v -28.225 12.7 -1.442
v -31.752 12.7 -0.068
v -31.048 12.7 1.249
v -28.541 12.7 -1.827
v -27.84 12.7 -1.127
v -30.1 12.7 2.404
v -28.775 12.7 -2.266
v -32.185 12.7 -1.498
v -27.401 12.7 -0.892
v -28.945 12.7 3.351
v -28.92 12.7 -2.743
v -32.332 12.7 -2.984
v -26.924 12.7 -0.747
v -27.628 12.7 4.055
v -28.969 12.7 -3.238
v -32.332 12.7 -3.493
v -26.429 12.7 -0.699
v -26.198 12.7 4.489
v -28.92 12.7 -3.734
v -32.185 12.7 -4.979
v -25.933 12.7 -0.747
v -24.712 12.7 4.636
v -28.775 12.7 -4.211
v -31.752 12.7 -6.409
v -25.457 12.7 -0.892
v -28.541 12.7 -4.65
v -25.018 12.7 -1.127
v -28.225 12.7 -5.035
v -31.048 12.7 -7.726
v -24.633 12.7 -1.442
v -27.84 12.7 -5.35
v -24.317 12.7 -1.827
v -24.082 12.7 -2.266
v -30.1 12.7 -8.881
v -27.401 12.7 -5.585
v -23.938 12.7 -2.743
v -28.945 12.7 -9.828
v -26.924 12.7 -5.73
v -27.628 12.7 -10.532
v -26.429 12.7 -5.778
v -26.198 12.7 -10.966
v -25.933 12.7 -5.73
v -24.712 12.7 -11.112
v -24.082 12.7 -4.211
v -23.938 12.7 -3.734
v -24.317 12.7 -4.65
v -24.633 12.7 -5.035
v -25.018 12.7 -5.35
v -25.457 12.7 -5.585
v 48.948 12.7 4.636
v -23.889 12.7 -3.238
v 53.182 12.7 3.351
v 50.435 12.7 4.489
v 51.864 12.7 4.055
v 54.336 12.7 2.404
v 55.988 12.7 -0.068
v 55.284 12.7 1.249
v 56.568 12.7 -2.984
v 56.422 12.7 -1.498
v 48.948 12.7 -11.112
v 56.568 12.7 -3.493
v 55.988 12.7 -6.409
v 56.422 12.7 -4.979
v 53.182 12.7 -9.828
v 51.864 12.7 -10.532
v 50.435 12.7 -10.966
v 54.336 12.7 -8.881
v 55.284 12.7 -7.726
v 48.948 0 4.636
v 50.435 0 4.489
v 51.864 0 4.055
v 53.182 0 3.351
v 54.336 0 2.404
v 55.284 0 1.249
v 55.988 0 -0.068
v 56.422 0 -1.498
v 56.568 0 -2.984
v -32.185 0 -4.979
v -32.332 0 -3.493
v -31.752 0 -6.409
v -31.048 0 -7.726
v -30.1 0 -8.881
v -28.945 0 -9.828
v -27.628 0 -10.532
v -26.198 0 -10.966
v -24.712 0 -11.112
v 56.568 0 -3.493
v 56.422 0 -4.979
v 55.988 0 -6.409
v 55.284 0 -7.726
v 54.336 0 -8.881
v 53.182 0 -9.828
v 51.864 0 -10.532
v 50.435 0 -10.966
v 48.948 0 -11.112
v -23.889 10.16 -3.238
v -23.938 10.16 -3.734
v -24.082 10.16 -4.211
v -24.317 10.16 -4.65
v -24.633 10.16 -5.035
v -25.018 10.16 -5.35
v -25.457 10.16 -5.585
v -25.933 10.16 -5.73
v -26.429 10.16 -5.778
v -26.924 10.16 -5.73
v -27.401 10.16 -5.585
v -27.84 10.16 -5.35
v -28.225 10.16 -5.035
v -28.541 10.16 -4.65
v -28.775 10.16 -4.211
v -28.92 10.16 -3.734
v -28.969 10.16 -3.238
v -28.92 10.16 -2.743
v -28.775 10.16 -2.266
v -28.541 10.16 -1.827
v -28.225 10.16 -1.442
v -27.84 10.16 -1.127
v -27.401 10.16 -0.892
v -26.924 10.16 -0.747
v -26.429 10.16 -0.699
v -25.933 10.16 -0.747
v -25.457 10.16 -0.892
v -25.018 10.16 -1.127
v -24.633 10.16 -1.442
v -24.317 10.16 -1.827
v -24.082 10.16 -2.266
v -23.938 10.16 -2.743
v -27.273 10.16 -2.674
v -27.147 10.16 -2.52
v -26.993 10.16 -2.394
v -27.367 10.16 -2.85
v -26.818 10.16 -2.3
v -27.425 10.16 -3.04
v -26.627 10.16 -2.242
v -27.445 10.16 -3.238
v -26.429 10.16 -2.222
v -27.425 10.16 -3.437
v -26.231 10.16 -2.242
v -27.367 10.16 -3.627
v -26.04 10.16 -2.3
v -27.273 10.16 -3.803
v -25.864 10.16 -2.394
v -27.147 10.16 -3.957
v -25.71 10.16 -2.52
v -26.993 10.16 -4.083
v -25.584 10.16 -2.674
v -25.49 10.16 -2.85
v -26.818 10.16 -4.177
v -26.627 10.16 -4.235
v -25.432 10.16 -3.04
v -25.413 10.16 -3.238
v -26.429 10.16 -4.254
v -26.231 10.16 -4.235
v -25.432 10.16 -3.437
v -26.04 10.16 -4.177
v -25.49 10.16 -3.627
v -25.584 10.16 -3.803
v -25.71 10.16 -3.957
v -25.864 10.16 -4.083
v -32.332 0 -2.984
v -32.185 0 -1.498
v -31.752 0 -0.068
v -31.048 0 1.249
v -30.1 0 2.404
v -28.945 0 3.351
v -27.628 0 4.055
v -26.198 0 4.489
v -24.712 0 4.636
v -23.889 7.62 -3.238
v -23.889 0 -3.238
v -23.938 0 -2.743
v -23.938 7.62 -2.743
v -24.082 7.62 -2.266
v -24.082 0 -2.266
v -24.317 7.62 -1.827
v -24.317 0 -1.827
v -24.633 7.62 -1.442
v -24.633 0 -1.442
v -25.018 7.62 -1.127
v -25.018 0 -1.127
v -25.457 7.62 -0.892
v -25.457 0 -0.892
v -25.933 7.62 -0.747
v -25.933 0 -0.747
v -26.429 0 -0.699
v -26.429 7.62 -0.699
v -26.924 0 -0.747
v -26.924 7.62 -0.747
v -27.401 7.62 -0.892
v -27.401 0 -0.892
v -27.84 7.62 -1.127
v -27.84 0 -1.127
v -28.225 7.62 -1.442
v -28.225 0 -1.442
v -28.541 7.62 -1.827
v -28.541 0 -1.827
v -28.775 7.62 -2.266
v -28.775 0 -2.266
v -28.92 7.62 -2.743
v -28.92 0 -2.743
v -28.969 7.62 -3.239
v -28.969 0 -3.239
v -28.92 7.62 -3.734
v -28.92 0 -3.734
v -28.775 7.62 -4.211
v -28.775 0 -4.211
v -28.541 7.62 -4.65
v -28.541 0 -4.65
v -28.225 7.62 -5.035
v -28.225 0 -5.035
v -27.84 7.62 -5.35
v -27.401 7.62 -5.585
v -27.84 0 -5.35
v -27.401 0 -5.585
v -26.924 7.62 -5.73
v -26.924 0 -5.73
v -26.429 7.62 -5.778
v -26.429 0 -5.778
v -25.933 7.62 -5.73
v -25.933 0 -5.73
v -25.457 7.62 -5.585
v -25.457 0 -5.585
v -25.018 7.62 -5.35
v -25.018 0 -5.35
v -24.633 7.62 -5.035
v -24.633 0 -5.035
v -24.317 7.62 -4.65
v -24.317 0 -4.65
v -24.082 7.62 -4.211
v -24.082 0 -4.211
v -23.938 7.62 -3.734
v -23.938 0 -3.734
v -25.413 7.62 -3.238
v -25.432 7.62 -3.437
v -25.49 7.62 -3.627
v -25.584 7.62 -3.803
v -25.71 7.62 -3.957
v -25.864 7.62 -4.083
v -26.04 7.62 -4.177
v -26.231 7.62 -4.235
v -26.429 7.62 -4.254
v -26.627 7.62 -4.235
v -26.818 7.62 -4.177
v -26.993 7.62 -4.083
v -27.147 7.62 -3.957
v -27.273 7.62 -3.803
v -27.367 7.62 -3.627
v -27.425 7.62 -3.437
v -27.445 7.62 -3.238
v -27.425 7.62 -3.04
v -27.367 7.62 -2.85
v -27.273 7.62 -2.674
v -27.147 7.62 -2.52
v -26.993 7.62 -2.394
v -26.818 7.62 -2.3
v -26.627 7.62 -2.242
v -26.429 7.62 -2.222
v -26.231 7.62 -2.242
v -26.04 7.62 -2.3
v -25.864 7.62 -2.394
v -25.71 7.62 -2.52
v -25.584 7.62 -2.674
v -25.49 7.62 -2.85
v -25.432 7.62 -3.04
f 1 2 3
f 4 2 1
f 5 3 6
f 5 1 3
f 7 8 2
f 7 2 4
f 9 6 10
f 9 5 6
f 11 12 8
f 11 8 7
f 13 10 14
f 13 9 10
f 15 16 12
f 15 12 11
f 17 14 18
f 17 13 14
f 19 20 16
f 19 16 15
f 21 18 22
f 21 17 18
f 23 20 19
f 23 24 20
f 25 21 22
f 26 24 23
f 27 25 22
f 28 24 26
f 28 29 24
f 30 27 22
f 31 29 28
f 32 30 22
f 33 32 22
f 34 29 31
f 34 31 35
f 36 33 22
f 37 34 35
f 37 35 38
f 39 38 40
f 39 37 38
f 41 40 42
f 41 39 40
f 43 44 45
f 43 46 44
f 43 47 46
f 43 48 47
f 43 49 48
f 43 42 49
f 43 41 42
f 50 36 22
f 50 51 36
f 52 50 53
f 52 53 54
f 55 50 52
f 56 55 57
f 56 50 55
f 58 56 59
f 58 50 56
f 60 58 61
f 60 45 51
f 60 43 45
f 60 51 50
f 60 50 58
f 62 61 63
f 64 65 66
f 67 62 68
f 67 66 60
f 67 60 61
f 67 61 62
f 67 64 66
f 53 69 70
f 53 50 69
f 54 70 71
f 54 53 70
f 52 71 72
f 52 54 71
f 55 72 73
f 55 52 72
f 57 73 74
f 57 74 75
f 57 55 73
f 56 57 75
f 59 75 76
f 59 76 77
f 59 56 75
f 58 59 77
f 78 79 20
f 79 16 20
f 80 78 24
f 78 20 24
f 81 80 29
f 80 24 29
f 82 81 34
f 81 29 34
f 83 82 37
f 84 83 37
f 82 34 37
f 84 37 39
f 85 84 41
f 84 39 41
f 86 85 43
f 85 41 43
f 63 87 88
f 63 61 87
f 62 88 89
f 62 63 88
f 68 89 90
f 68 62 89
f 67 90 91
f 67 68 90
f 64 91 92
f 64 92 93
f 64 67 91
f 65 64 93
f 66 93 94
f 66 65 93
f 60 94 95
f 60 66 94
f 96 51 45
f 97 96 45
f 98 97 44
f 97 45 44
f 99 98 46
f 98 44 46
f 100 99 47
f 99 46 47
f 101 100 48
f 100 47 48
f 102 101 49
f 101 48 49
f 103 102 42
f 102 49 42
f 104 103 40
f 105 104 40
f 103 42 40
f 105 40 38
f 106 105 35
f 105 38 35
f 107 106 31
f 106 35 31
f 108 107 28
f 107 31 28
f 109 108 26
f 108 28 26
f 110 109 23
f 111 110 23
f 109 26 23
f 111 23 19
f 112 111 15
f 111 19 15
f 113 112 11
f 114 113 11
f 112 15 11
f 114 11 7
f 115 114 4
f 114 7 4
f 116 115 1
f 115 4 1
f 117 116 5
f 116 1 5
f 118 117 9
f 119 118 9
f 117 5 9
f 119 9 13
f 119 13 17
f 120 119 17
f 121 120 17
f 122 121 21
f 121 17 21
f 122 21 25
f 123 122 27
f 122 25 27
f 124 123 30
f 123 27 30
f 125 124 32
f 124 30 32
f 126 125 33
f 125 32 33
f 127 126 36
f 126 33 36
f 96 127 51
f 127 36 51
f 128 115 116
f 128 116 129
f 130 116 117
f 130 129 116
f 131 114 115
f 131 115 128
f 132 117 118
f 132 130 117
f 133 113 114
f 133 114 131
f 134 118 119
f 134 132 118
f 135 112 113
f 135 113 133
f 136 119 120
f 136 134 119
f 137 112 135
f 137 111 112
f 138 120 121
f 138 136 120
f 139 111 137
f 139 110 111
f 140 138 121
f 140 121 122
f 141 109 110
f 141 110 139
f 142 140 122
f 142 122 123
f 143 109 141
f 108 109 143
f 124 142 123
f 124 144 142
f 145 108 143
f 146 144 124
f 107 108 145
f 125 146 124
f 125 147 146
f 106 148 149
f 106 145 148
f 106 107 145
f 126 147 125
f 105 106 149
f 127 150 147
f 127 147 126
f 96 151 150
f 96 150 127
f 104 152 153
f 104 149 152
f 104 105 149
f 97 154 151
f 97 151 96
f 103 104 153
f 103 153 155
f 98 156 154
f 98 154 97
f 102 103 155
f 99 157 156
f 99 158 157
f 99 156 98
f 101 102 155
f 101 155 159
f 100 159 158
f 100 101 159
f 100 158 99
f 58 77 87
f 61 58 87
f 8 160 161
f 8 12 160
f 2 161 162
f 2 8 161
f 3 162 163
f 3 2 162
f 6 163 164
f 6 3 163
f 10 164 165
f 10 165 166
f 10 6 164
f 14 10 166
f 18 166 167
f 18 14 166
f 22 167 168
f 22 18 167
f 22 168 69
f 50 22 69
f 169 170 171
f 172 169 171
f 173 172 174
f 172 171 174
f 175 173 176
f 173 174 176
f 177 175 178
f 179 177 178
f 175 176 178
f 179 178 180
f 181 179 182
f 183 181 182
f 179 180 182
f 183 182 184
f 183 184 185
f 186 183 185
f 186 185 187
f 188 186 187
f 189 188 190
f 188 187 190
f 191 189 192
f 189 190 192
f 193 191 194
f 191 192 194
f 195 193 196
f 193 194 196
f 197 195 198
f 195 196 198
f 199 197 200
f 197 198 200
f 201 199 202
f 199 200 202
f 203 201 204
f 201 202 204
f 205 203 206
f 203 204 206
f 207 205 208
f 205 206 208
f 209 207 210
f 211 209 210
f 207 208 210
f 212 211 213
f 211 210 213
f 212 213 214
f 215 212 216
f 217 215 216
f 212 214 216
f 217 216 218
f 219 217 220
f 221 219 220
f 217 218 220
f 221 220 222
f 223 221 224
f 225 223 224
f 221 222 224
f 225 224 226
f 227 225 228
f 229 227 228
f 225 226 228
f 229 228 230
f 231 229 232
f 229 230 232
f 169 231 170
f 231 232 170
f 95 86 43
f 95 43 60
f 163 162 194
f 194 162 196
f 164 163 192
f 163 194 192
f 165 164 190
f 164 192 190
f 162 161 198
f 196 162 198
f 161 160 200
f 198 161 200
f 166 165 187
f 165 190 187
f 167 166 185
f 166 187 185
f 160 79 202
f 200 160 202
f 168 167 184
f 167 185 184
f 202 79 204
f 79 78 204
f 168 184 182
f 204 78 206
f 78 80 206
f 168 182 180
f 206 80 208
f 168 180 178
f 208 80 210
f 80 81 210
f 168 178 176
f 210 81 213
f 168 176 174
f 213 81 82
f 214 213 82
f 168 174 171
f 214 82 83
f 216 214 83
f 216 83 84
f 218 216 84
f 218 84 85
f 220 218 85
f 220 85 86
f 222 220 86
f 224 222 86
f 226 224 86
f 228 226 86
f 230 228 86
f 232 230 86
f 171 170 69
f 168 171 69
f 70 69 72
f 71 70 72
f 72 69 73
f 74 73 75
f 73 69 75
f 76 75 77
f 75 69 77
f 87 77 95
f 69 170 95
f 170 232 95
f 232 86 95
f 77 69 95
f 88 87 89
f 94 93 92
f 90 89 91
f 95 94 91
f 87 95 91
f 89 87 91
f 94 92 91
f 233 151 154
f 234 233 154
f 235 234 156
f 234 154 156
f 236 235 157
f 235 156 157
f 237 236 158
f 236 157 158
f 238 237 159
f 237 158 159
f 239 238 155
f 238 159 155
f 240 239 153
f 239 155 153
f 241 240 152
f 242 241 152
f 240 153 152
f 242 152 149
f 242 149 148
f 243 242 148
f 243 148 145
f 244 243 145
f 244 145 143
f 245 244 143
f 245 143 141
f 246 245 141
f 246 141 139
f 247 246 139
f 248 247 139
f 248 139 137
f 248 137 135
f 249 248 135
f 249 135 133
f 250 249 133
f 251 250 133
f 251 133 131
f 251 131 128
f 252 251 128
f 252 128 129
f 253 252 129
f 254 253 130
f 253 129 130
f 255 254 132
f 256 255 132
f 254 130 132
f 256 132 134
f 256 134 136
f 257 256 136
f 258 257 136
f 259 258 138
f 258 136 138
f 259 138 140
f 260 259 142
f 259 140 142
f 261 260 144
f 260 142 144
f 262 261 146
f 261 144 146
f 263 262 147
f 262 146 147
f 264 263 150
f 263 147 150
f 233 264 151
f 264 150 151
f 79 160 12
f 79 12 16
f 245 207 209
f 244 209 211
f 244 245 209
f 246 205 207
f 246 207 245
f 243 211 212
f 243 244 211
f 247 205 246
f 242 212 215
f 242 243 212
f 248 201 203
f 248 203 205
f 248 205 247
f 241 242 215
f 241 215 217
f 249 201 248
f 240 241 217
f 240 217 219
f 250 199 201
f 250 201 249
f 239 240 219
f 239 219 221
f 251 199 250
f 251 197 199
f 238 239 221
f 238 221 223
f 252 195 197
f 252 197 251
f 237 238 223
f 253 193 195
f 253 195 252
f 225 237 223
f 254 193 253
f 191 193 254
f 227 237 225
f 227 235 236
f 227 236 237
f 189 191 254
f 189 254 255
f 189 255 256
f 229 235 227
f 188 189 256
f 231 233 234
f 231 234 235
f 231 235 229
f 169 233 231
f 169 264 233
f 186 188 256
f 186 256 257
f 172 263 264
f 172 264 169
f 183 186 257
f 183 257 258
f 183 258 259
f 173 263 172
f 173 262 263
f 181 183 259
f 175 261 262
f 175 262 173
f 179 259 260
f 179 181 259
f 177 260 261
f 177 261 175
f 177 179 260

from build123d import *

# Parameters (mm, degrees)
SKETCH1_W           = 88.9
SKETCH1_H           = 15.748
BOSS_EXTRUDE1_DEPTH = 12.7
FILLET1_R           = 7.62
SKETCH2_R           = 2.54
CUT_EXTRUDE1_DEPTH  = 2.54
SKETCH3_R           = 2.54
CUT_EXTRUDE2_DEPTH  = 7.62
SKETCH4_R           = 1.016
CUT_EXTRUDE3_DEPTH  = 5.08


with BuildPart() as part:
    # Sketch1 → Boss-Extrude1 (new body)
    with BuildSketch(Plane(origin=(0, 0, 0), x_dir=(1, 0, 0), z_dir=(0, 1, 0))):
        with Locations((12.118156109, 3.2385)):
            Rectangle(SKETCH1_W, SKETCH1_H)
    extrude(amount=BOSS_EXTRUDE1_DEPTH)

    # Fillet1
    fillet1_edges = [part.edges().sort_by_distance(p)[0] for p in [
        (-32.331843891, 6.35, -11.1125),
        (56.568156109, 6.35, -11.1125),
        (56.568156109, 6.35, 4.6355),
        (-32.331843891, 6.35, 4.6355),
    ]]
    fillet(fillet1_edges, radius=FILLET1_R)

    # Sketch2 → Cut-Extrude1 (cut)
    with BuildSketch(Plane(origin=(0, 12.7, 0), x_dir=(1, 0, 0), z_dir=(0, 1, 0))):
        with Locations((-26.428712343, 3.2385)):
            Circle(SKETCH2_R)
    extrude(amount=-CUT_EXTRUDE1_DEPTH, mode=Mode.SUBTRACT)

    # Sketch3 → Cut-Extrude2 (cut)
    with BuildSketch(Plane.XZ):
        with Locations((-26.428712343, -3.2385)):
            Circle(SKETCH3_R)
    extrude(amount=-CUT_EXTRUDE2_DEPTH, mode=Mode.SUBTRACT)

    # Sketch4 → Cut-Extrude3 (cut)
    with BuildSketch(Plane(origin=(0, 10.16, 0), x_dir=(1, 0, 0), z_dir=(0, 1, 0))):
        with Locations((-26.428712343, 3.2385)):
            Circle(SKETCH4_R)
    extrude(amount=-CUT_EXTRUDE3_DEPTH, mode=Mode.SUBTRACT)


solid = part.part
